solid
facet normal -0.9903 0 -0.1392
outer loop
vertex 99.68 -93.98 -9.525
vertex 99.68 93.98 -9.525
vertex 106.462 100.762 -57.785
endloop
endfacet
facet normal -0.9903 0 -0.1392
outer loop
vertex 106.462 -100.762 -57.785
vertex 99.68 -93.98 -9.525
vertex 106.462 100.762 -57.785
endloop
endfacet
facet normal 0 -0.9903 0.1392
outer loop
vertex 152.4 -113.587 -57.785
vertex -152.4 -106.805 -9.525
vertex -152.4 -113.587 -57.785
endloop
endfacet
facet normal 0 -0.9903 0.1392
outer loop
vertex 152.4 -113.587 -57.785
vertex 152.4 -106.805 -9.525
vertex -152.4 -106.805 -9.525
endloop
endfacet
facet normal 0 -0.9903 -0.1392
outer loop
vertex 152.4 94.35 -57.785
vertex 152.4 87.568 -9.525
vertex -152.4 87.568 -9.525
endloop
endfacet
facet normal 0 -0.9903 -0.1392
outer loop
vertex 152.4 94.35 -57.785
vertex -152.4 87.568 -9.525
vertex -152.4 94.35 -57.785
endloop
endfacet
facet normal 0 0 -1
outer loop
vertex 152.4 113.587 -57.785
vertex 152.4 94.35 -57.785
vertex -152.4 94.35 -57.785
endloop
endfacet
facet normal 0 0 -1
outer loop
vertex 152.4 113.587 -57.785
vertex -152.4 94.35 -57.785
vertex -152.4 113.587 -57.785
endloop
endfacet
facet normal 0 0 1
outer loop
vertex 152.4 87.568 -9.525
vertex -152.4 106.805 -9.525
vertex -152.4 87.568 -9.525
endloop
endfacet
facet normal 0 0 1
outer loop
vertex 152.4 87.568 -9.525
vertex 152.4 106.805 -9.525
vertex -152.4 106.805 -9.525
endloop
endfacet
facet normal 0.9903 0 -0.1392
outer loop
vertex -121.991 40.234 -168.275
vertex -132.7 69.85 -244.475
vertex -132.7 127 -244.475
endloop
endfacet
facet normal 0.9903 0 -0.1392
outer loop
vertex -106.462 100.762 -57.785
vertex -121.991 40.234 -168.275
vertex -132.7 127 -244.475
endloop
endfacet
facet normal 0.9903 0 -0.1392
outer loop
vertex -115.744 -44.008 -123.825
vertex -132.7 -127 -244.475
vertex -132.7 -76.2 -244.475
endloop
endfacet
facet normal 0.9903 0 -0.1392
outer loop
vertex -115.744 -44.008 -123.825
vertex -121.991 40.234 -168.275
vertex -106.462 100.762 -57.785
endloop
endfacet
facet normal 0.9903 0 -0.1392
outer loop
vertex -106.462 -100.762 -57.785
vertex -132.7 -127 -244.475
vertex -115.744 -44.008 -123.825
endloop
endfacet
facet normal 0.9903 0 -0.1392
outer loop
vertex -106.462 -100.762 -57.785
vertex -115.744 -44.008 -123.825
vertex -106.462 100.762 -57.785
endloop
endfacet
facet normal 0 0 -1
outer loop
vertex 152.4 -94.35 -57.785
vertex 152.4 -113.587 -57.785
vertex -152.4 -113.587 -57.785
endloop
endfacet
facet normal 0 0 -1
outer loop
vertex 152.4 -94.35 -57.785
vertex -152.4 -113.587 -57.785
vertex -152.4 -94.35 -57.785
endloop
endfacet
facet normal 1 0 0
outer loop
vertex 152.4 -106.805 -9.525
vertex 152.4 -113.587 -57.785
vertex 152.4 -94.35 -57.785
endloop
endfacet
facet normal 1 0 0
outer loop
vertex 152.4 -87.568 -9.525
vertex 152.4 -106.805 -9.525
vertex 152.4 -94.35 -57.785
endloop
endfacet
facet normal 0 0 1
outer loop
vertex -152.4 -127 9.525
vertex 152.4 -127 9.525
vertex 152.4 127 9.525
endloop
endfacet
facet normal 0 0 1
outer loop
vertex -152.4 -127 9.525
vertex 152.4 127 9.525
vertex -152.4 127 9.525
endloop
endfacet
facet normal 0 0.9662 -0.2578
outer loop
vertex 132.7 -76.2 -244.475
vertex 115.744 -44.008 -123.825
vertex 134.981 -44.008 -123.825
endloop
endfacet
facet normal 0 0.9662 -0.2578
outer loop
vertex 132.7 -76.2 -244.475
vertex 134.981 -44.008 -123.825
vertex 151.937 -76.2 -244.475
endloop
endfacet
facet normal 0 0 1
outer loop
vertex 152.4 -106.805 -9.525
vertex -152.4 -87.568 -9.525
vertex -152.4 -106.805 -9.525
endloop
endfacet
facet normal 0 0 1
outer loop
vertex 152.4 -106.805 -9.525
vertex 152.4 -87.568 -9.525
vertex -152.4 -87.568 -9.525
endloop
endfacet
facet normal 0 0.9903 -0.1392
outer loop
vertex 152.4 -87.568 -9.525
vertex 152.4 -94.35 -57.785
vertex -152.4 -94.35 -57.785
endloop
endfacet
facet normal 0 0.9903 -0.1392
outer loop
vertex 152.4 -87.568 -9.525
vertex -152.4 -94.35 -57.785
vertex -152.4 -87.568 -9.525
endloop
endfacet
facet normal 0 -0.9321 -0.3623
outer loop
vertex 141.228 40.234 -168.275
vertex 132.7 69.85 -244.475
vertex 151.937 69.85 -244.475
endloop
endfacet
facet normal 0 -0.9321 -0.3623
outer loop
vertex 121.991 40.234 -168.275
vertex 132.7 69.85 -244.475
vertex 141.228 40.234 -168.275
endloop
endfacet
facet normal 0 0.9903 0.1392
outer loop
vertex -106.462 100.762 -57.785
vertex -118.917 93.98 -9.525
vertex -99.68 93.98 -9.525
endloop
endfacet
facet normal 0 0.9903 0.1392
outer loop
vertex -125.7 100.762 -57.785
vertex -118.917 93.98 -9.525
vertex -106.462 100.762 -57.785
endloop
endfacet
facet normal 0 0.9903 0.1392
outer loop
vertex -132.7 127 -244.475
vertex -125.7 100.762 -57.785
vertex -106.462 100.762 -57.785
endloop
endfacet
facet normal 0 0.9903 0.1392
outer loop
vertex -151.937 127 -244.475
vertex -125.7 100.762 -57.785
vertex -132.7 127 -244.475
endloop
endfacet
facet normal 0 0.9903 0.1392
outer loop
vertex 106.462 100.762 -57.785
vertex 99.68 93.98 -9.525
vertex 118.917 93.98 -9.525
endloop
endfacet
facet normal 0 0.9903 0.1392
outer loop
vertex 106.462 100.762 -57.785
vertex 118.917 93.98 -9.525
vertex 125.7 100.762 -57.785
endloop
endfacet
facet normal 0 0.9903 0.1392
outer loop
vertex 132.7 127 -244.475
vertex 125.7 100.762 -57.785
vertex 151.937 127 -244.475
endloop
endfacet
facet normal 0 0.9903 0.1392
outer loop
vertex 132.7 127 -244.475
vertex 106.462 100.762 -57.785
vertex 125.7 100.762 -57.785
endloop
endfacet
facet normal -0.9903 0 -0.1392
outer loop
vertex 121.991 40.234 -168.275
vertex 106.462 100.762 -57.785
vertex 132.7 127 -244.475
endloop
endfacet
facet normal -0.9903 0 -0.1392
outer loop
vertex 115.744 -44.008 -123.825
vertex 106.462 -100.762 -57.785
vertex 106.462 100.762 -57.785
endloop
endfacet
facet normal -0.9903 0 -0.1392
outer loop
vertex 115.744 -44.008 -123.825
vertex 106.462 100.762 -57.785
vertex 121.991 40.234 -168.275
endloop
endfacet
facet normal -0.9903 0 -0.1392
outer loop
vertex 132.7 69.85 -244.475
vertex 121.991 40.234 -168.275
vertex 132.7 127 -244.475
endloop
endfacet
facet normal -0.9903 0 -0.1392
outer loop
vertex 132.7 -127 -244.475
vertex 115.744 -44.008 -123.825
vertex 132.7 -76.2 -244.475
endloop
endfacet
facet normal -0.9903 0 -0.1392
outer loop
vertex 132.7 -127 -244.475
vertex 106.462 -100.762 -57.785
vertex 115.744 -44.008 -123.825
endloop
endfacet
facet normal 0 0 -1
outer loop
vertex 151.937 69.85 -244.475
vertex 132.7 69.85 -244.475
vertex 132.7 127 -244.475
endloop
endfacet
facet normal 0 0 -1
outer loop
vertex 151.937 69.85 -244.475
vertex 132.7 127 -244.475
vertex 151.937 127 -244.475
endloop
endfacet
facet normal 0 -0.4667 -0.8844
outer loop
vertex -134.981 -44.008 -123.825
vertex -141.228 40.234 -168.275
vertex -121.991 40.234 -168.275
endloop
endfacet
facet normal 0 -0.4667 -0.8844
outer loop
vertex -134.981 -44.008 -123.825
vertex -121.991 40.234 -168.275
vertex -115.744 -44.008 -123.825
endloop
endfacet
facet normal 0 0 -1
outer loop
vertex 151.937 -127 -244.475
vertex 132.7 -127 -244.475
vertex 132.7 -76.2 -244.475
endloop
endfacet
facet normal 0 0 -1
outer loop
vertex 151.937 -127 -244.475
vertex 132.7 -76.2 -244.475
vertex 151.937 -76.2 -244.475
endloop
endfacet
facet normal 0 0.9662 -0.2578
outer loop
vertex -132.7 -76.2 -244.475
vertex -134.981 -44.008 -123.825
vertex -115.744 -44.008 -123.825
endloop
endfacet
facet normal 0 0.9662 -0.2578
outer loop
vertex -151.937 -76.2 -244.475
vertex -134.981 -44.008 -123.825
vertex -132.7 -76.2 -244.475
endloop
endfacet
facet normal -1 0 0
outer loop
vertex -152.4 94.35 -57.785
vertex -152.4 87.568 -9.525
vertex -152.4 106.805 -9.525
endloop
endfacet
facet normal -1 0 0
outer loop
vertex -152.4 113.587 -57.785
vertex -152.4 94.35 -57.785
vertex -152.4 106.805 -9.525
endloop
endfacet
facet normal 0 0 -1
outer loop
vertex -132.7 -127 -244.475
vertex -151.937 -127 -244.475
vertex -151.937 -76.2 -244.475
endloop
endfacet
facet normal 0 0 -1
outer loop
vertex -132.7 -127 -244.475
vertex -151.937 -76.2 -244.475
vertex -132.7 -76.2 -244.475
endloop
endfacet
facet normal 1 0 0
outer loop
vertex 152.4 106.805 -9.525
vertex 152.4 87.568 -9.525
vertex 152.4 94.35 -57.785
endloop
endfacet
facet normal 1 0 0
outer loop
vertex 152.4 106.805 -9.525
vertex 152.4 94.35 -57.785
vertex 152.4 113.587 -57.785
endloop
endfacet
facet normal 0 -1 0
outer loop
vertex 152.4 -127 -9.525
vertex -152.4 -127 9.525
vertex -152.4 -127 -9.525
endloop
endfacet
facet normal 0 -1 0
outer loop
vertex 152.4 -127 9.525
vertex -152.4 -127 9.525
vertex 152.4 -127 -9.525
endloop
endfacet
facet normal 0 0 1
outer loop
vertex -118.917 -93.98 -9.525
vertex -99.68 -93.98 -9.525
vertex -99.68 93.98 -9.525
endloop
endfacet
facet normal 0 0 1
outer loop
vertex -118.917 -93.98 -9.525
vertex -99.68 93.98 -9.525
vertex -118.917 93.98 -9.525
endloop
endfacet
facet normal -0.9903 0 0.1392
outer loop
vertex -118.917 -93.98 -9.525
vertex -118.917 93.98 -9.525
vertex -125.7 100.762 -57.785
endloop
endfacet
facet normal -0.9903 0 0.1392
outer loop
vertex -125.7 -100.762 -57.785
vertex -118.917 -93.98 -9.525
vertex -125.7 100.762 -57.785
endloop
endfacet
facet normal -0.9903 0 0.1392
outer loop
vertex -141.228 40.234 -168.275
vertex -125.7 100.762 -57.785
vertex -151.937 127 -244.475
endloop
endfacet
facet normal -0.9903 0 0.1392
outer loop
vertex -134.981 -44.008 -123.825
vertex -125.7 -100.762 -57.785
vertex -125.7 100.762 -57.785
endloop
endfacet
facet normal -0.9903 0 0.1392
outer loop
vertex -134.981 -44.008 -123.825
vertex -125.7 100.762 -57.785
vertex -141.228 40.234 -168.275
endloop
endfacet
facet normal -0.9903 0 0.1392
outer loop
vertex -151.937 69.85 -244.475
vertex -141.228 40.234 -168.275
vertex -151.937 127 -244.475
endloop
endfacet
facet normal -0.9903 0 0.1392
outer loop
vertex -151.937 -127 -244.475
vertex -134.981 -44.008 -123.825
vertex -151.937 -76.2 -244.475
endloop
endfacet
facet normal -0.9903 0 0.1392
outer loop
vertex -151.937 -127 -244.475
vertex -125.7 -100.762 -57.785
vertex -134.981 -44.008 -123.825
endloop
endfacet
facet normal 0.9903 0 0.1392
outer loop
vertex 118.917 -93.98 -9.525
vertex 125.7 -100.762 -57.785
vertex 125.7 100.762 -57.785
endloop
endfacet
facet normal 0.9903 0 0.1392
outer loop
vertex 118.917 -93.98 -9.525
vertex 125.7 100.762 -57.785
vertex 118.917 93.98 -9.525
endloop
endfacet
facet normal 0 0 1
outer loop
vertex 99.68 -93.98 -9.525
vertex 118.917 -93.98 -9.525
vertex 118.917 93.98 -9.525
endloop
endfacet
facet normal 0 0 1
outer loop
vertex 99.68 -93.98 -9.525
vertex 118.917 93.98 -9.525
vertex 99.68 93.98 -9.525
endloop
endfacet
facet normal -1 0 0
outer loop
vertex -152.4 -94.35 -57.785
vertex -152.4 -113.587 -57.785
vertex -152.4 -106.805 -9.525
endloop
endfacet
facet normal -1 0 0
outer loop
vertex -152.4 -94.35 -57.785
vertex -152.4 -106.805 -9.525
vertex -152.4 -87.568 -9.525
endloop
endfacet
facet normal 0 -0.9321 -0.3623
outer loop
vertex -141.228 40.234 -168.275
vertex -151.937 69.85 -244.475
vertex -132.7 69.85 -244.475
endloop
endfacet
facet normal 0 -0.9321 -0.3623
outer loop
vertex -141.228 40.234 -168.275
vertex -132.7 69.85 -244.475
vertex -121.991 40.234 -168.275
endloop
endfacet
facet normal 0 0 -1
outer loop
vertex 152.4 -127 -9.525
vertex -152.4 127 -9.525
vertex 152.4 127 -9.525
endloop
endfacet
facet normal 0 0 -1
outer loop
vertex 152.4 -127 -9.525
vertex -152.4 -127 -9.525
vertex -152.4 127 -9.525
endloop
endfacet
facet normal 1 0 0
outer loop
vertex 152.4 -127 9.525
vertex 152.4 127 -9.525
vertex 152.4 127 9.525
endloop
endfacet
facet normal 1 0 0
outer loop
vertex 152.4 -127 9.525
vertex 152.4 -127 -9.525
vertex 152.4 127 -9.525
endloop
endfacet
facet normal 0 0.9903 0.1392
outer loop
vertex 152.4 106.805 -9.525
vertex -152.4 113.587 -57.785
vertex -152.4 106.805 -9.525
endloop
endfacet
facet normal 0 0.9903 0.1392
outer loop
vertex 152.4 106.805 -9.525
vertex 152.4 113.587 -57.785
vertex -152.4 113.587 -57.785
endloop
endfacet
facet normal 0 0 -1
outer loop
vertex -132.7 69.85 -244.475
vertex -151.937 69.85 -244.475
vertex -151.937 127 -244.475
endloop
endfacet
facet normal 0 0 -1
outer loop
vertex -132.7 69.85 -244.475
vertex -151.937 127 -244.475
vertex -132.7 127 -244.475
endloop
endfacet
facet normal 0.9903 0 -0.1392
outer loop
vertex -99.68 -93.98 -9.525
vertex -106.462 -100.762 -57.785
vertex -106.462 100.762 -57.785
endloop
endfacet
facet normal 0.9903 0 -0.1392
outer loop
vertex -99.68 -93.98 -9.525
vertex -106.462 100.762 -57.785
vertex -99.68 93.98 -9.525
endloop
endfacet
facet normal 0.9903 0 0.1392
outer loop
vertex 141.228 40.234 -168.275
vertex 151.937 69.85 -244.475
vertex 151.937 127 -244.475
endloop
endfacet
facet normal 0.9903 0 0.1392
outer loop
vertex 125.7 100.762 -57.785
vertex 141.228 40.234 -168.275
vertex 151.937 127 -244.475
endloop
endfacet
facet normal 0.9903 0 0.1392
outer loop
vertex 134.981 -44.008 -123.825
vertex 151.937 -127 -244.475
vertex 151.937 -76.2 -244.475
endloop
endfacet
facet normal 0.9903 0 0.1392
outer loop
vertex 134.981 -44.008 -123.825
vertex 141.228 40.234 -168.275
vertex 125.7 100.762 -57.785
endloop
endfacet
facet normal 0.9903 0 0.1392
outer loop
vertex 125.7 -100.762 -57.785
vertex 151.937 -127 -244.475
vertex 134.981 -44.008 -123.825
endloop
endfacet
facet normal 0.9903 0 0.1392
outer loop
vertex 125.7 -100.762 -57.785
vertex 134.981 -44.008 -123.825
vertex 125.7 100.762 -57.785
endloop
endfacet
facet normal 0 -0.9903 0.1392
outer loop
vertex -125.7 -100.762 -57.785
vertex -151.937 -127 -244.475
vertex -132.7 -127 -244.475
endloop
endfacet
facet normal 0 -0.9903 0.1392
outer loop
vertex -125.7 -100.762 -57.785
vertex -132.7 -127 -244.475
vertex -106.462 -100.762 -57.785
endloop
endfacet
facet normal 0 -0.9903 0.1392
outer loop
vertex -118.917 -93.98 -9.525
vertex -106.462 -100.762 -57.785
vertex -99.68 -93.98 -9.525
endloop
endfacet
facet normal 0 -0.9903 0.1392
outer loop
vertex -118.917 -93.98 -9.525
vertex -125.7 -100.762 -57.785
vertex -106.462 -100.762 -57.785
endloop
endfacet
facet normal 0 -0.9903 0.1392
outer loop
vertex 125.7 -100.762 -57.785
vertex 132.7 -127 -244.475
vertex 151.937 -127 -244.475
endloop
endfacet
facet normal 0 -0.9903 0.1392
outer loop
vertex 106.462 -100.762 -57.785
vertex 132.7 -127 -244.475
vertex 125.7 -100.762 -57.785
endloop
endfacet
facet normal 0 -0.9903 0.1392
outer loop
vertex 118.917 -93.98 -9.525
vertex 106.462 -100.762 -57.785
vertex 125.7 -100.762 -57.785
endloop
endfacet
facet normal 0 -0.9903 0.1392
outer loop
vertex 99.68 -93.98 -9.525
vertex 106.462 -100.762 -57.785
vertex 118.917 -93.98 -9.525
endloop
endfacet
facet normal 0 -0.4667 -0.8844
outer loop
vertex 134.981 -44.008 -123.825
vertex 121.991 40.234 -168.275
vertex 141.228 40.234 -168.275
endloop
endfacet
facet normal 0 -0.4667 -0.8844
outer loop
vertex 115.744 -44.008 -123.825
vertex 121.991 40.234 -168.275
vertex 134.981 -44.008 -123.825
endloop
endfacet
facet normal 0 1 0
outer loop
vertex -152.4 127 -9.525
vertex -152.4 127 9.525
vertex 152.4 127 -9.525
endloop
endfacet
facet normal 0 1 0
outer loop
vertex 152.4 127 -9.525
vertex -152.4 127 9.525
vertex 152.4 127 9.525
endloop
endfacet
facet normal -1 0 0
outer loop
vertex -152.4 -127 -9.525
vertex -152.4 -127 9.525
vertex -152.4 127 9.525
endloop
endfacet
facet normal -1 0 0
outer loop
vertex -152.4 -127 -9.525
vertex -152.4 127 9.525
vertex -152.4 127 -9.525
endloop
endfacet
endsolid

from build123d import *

# Parameters (mm, degrees)
F1_DEPTH      = 127
F2_DEPTH      = 127
F2_DEPTH_BACK = 127
F4_DEPTH      = 152.401
F4_DEPTH_BACK = 152.401
F6_DEPTH      = 152.4
F6_DEPTH_BACK = 152.4


# Not quite as in the source:
# - a feature names something its author has since deleted; it is built from what else it names


with BuildPart() as f1:
    # F0 (on Front) → F1 (new body, symmetric)
    with BuildSketch(Plane.XZ):
        Polygon((152.4, -9.525), (152.4, 9.525), (-152.4, 9.525), (-152.4, -9.525), (-151.9371964019, -9.525), (-141.1124509845, -9.525), (-118.9171865446, -9.525), (-99.6799712881, -9.525), (99.6799712881, -9.525), (118.9171865446, -9.525), (141.1124509845, -9.525), (151.9371964019, -9.525), align=None)
    extrude(amount=F1_DEPTH, both=True)


with BuildPart() as f2:
    # F0 (on Front) → F2 (new body, two sides)
    with BuildSketch(Plane.XZ) as f2_sk:
        Polygon((-99.6799712881, -9.525), (-118.9171865446, -9.525), (-125.6996872273, -57.785), (-106.4624719709, -57.785), align=None)
        Polygon((-106.4624719709, -57.785), (-125.6996872273, -57.785), (-151.9371964019, -244.4745783714), (-132.6999811454, -244.4745783714), align=None)
    extrude(amount=F2_DEPTH)
    extrude(f2_sk.sketch, amount=-F2_DEPTH_BACK)


with BuildPart() as f2b:
    # F0 (on Front) → F2, piece 2 (new body, two sides)
    with BuildSketch(Plane.XZ) as f2_2_sk:
        Polygon((125.6996872273, -57.785), (118.9171865446, -9.525), (99.6799712881, -9.525), (106.4624719709, -57.785), align=None)
        Polygon((151.9371964019, -244.4745783714), (125.6996872273, -57.785), (106.4624719709, -57.785), (132.6999811454, -244.4745783714), align=None)
    extrude(amount=F2_DEPTH)
    extrude(f2_2_sk.sketch, amount=-F2_DEPTH_BACK)


with BuildPart() as f4_tool:
    # F3 (on Right) → F4 (new body, two sides)
    with BuildSketch(Plane.YZ) as f4_sk:
        Polygon((-76.2000000004, -244.4745783714), (69.8500000004, -244.4745783714), (40.2337837021, -168.2745783714), (-44.0084859729, -123.8245783714), align=None)
        Polygon((126.9999999998, -244.4745783714), (126.9999999997, -9.525), (93.9799901431, -9.525), align=None)
        Polygon((-127.0000000004, -244.4745783714), (-93.9799901431, -9.525), (-127.0000000004, -9.525), align=None)
    extrude(amount=-F4_DEPTH)
    extrude(f4_sk.sketch, amount=F4_DEPTH_BACK)


with BuildPart() as f2_1:
    add(f2.part)

    # F4: cut by f4_tool
    add(f4_tool.part, mode=Mode.SUBTRACT)


with BuildPart() as f2b_1:
    add(f2b.part)

    # F4: cut by f4_tool
    add(f4_tool.part, mode=Mode.SUBTRACT)


with BuildPart() as f6:
    # F5 (on Right) → F6 (new body, two sides)
    with BuildSketch(Plane.YZ) as f6_sk:
        Polygon((-93.9799901431, -9.525), (-106.8048003141, -9.525), (-113.5873009968, -57.785), (-100.7624908258, -57.785), align=None)
        Polygon((-87.5675850576, -9.525), (-93.9799901431, -9.525), (-100.7624908258, -57.785), (-94.3500857403, -57.785), align=None)
    extrude(amount=F6_DEPTH)
    extrude(f6_sk.sketch, amount=-F6_DEPTH_BACK)


with BuildPart() as f6b:
    # F5 (on Right) → F6, piece 2 (new body, two sides)
    with BuildSketch(Plane.YZ) as f6_2_sk:
        Polygon((106.8048003141, -9.525), (93.9799901431, -9.525), (100.7624908258, -57.785), (113.5873009968, -57.785), align=None)
        Polygon((93.9799901431, -9.525), (87.5675850576, -9.525), (94.3500857403, -57.785), (100.7624908258, -57.785), align=None)
    extrude(amount=F6_DEPTH)
    extrude(f6_2_sk.sketch, amount=-F6_DEPTH_BACK)


solid = Compound([f1.part, f2_1.part, f2b_1.part, f6.part, f6b.part])
